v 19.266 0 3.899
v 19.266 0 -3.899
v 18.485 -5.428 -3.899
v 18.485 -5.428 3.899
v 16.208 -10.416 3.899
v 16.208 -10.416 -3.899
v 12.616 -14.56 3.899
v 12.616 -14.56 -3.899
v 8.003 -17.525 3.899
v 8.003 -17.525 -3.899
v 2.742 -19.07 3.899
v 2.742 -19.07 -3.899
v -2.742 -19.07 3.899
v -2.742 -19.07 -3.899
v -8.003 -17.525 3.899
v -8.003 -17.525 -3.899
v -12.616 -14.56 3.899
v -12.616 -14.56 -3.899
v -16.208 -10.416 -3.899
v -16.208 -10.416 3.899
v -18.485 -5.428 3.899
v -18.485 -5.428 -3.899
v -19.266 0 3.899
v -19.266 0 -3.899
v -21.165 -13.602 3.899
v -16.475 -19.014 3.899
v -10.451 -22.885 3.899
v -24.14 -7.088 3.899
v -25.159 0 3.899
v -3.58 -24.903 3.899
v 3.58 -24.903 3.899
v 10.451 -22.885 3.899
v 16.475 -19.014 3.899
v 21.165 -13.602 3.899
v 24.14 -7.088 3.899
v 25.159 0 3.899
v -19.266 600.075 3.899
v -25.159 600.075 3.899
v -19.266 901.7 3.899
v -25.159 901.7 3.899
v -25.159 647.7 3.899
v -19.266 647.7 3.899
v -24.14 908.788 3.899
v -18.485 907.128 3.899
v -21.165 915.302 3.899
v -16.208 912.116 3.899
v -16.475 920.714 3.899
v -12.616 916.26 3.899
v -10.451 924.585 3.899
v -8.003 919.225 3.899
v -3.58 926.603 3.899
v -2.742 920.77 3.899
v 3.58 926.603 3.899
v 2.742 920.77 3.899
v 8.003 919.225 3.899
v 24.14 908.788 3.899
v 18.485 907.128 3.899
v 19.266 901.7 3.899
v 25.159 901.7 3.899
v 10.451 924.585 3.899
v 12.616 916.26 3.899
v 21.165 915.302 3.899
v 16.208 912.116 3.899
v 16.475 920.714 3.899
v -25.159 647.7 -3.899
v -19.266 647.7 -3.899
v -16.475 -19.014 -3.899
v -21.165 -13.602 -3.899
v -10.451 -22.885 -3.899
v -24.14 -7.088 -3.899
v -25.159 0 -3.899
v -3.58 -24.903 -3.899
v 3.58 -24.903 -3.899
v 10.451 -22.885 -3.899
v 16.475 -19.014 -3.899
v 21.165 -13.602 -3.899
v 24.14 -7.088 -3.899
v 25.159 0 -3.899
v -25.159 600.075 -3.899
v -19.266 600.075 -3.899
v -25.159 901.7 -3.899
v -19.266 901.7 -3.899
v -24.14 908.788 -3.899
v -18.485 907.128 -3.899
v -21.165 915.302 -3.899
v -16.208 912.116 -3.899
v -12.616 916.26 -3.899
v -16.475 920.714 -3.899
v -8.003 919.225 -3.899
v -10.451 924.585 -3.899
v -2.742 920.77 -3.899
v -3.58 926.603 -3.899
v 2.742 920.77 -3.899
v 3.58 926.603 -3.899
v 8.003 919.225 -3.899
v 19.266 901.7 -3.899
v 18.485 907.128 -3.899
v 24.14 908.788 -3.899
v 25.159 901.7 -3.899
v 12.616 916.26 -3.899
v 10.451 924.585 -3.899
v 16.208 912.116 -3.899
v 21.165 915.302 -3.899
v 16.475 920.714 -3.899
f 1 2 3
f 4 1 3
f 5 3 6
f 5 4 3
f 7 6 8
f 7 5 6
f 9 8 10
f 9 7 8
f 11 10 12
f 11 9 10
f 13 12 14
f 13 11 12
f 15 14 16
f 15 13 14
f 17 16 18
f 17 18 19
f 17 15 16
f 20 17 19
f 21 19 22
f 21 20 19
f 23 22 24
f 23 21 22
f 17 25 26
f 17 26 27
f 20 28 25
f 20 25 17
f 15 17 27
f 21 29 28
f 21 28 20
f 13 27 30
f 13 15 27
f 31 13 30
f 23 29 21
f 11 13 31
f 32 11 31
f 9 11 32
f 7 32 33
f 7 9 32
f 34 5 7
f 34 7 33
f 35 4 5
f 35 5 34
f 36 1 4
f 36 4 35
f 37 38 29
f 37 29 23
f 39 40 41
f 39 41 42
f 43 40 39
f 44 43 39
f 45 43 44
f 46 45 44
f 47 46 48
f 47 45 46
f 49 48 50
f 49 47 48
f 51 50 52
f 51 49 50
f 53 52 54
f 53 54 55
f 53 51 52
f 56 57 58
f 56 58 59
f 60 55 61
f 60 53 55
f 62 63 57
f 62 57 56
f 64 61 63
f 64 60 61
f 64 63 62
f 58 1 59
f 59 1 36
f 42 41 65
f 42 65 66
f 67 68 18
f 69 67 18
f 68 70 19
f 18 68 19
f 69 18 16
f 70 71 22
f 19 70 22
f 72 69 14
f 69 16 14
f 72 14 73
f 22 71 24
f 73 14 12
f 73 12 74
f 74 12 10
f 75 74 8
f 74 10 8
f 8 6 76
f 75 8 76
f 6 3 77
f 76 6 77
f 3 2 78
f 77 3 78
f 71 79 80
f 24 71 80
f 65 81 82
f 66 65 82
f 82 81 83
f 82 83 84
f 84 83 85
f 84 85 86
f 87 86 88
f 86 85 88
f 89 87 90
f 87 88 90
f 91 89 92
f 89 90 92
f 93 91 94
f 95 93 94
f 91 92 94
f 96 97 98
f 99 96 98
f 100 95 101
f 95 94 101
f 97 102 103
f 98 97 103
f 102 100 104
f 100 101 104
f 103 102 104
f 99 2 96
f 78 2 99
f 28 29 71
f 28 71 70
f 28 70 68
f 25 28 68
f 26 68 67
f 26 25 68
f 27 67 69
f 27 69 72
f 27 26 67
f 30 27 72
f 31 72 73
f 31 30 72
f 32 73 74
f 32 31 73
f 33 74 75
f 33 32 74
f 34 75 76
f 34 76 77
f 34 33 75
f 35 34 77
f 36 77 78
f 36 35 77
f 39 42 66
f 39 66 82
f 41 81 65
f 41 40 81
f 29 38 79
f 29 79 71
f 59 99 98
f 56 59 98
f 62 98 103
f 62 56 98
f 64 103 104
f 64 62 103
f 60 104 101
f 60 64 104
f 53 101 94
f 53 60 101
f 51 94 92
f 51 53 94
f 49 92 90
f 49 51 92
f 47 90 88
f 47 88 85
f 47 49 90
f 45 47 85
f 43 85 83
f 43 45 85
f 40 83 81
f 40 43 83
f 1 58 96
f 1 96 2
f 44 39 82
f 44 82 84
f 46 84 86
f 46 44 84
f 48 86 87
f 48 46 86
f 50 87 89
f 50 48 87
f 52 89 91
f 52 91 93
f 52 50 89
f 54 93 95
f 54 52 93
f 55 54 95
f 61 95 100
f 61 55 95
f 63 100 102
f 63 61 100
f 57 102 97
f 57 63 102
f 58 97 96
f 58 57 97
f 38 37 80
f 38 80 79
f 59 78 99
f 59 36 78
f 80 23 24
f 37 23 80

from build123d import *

# Parameters (mm, degrees)
BOSS_EXTRUDE1_DEPTH = 3.8989


with BuildPart() as part:
    # Sketch1 → Boss-Extrude1 (new body, symmetric)
    with BuildSketch(Plane.XY):
        with BuildLine():
            Line((-25.1587, 901.7), (-25.1587, 647.7))
            Line((-25.1587, 647.7), (-19.2659, 647.7))
            Line((-19.2659, 647.7), (-19.2659, 901.7))
            ThreePointArc((-19.2659, 901.7), (0, 920.9659), (19.2659, 901.7))
            Line((19.2659, 901.7), (19.2659, 0))
            ThreePointArc((19.2659, 0), (0, -19.2659), (-19.2659, 0))
            Line((-19.2659, 0), (-19.2659, 600.075))
            Line((-19.2659, 600.075), (-25.1587, 600.075))
            Line((-25.1587, 600.075), (-25.1587, 0))
            ThreePointArc((-25.1587, 0), (0, -25.1587), (25.1587, 0))
            Line((25.1587, 0), (25.1587, 901.7))
            ThreePointArc((25.1587, 901.7), (0, 926.8587), (-25.1587, 901.7))
        make_face()
    extrude(amount=BOSS_EXTRUDE1_DEPTH, both=True)


solid = part.part
